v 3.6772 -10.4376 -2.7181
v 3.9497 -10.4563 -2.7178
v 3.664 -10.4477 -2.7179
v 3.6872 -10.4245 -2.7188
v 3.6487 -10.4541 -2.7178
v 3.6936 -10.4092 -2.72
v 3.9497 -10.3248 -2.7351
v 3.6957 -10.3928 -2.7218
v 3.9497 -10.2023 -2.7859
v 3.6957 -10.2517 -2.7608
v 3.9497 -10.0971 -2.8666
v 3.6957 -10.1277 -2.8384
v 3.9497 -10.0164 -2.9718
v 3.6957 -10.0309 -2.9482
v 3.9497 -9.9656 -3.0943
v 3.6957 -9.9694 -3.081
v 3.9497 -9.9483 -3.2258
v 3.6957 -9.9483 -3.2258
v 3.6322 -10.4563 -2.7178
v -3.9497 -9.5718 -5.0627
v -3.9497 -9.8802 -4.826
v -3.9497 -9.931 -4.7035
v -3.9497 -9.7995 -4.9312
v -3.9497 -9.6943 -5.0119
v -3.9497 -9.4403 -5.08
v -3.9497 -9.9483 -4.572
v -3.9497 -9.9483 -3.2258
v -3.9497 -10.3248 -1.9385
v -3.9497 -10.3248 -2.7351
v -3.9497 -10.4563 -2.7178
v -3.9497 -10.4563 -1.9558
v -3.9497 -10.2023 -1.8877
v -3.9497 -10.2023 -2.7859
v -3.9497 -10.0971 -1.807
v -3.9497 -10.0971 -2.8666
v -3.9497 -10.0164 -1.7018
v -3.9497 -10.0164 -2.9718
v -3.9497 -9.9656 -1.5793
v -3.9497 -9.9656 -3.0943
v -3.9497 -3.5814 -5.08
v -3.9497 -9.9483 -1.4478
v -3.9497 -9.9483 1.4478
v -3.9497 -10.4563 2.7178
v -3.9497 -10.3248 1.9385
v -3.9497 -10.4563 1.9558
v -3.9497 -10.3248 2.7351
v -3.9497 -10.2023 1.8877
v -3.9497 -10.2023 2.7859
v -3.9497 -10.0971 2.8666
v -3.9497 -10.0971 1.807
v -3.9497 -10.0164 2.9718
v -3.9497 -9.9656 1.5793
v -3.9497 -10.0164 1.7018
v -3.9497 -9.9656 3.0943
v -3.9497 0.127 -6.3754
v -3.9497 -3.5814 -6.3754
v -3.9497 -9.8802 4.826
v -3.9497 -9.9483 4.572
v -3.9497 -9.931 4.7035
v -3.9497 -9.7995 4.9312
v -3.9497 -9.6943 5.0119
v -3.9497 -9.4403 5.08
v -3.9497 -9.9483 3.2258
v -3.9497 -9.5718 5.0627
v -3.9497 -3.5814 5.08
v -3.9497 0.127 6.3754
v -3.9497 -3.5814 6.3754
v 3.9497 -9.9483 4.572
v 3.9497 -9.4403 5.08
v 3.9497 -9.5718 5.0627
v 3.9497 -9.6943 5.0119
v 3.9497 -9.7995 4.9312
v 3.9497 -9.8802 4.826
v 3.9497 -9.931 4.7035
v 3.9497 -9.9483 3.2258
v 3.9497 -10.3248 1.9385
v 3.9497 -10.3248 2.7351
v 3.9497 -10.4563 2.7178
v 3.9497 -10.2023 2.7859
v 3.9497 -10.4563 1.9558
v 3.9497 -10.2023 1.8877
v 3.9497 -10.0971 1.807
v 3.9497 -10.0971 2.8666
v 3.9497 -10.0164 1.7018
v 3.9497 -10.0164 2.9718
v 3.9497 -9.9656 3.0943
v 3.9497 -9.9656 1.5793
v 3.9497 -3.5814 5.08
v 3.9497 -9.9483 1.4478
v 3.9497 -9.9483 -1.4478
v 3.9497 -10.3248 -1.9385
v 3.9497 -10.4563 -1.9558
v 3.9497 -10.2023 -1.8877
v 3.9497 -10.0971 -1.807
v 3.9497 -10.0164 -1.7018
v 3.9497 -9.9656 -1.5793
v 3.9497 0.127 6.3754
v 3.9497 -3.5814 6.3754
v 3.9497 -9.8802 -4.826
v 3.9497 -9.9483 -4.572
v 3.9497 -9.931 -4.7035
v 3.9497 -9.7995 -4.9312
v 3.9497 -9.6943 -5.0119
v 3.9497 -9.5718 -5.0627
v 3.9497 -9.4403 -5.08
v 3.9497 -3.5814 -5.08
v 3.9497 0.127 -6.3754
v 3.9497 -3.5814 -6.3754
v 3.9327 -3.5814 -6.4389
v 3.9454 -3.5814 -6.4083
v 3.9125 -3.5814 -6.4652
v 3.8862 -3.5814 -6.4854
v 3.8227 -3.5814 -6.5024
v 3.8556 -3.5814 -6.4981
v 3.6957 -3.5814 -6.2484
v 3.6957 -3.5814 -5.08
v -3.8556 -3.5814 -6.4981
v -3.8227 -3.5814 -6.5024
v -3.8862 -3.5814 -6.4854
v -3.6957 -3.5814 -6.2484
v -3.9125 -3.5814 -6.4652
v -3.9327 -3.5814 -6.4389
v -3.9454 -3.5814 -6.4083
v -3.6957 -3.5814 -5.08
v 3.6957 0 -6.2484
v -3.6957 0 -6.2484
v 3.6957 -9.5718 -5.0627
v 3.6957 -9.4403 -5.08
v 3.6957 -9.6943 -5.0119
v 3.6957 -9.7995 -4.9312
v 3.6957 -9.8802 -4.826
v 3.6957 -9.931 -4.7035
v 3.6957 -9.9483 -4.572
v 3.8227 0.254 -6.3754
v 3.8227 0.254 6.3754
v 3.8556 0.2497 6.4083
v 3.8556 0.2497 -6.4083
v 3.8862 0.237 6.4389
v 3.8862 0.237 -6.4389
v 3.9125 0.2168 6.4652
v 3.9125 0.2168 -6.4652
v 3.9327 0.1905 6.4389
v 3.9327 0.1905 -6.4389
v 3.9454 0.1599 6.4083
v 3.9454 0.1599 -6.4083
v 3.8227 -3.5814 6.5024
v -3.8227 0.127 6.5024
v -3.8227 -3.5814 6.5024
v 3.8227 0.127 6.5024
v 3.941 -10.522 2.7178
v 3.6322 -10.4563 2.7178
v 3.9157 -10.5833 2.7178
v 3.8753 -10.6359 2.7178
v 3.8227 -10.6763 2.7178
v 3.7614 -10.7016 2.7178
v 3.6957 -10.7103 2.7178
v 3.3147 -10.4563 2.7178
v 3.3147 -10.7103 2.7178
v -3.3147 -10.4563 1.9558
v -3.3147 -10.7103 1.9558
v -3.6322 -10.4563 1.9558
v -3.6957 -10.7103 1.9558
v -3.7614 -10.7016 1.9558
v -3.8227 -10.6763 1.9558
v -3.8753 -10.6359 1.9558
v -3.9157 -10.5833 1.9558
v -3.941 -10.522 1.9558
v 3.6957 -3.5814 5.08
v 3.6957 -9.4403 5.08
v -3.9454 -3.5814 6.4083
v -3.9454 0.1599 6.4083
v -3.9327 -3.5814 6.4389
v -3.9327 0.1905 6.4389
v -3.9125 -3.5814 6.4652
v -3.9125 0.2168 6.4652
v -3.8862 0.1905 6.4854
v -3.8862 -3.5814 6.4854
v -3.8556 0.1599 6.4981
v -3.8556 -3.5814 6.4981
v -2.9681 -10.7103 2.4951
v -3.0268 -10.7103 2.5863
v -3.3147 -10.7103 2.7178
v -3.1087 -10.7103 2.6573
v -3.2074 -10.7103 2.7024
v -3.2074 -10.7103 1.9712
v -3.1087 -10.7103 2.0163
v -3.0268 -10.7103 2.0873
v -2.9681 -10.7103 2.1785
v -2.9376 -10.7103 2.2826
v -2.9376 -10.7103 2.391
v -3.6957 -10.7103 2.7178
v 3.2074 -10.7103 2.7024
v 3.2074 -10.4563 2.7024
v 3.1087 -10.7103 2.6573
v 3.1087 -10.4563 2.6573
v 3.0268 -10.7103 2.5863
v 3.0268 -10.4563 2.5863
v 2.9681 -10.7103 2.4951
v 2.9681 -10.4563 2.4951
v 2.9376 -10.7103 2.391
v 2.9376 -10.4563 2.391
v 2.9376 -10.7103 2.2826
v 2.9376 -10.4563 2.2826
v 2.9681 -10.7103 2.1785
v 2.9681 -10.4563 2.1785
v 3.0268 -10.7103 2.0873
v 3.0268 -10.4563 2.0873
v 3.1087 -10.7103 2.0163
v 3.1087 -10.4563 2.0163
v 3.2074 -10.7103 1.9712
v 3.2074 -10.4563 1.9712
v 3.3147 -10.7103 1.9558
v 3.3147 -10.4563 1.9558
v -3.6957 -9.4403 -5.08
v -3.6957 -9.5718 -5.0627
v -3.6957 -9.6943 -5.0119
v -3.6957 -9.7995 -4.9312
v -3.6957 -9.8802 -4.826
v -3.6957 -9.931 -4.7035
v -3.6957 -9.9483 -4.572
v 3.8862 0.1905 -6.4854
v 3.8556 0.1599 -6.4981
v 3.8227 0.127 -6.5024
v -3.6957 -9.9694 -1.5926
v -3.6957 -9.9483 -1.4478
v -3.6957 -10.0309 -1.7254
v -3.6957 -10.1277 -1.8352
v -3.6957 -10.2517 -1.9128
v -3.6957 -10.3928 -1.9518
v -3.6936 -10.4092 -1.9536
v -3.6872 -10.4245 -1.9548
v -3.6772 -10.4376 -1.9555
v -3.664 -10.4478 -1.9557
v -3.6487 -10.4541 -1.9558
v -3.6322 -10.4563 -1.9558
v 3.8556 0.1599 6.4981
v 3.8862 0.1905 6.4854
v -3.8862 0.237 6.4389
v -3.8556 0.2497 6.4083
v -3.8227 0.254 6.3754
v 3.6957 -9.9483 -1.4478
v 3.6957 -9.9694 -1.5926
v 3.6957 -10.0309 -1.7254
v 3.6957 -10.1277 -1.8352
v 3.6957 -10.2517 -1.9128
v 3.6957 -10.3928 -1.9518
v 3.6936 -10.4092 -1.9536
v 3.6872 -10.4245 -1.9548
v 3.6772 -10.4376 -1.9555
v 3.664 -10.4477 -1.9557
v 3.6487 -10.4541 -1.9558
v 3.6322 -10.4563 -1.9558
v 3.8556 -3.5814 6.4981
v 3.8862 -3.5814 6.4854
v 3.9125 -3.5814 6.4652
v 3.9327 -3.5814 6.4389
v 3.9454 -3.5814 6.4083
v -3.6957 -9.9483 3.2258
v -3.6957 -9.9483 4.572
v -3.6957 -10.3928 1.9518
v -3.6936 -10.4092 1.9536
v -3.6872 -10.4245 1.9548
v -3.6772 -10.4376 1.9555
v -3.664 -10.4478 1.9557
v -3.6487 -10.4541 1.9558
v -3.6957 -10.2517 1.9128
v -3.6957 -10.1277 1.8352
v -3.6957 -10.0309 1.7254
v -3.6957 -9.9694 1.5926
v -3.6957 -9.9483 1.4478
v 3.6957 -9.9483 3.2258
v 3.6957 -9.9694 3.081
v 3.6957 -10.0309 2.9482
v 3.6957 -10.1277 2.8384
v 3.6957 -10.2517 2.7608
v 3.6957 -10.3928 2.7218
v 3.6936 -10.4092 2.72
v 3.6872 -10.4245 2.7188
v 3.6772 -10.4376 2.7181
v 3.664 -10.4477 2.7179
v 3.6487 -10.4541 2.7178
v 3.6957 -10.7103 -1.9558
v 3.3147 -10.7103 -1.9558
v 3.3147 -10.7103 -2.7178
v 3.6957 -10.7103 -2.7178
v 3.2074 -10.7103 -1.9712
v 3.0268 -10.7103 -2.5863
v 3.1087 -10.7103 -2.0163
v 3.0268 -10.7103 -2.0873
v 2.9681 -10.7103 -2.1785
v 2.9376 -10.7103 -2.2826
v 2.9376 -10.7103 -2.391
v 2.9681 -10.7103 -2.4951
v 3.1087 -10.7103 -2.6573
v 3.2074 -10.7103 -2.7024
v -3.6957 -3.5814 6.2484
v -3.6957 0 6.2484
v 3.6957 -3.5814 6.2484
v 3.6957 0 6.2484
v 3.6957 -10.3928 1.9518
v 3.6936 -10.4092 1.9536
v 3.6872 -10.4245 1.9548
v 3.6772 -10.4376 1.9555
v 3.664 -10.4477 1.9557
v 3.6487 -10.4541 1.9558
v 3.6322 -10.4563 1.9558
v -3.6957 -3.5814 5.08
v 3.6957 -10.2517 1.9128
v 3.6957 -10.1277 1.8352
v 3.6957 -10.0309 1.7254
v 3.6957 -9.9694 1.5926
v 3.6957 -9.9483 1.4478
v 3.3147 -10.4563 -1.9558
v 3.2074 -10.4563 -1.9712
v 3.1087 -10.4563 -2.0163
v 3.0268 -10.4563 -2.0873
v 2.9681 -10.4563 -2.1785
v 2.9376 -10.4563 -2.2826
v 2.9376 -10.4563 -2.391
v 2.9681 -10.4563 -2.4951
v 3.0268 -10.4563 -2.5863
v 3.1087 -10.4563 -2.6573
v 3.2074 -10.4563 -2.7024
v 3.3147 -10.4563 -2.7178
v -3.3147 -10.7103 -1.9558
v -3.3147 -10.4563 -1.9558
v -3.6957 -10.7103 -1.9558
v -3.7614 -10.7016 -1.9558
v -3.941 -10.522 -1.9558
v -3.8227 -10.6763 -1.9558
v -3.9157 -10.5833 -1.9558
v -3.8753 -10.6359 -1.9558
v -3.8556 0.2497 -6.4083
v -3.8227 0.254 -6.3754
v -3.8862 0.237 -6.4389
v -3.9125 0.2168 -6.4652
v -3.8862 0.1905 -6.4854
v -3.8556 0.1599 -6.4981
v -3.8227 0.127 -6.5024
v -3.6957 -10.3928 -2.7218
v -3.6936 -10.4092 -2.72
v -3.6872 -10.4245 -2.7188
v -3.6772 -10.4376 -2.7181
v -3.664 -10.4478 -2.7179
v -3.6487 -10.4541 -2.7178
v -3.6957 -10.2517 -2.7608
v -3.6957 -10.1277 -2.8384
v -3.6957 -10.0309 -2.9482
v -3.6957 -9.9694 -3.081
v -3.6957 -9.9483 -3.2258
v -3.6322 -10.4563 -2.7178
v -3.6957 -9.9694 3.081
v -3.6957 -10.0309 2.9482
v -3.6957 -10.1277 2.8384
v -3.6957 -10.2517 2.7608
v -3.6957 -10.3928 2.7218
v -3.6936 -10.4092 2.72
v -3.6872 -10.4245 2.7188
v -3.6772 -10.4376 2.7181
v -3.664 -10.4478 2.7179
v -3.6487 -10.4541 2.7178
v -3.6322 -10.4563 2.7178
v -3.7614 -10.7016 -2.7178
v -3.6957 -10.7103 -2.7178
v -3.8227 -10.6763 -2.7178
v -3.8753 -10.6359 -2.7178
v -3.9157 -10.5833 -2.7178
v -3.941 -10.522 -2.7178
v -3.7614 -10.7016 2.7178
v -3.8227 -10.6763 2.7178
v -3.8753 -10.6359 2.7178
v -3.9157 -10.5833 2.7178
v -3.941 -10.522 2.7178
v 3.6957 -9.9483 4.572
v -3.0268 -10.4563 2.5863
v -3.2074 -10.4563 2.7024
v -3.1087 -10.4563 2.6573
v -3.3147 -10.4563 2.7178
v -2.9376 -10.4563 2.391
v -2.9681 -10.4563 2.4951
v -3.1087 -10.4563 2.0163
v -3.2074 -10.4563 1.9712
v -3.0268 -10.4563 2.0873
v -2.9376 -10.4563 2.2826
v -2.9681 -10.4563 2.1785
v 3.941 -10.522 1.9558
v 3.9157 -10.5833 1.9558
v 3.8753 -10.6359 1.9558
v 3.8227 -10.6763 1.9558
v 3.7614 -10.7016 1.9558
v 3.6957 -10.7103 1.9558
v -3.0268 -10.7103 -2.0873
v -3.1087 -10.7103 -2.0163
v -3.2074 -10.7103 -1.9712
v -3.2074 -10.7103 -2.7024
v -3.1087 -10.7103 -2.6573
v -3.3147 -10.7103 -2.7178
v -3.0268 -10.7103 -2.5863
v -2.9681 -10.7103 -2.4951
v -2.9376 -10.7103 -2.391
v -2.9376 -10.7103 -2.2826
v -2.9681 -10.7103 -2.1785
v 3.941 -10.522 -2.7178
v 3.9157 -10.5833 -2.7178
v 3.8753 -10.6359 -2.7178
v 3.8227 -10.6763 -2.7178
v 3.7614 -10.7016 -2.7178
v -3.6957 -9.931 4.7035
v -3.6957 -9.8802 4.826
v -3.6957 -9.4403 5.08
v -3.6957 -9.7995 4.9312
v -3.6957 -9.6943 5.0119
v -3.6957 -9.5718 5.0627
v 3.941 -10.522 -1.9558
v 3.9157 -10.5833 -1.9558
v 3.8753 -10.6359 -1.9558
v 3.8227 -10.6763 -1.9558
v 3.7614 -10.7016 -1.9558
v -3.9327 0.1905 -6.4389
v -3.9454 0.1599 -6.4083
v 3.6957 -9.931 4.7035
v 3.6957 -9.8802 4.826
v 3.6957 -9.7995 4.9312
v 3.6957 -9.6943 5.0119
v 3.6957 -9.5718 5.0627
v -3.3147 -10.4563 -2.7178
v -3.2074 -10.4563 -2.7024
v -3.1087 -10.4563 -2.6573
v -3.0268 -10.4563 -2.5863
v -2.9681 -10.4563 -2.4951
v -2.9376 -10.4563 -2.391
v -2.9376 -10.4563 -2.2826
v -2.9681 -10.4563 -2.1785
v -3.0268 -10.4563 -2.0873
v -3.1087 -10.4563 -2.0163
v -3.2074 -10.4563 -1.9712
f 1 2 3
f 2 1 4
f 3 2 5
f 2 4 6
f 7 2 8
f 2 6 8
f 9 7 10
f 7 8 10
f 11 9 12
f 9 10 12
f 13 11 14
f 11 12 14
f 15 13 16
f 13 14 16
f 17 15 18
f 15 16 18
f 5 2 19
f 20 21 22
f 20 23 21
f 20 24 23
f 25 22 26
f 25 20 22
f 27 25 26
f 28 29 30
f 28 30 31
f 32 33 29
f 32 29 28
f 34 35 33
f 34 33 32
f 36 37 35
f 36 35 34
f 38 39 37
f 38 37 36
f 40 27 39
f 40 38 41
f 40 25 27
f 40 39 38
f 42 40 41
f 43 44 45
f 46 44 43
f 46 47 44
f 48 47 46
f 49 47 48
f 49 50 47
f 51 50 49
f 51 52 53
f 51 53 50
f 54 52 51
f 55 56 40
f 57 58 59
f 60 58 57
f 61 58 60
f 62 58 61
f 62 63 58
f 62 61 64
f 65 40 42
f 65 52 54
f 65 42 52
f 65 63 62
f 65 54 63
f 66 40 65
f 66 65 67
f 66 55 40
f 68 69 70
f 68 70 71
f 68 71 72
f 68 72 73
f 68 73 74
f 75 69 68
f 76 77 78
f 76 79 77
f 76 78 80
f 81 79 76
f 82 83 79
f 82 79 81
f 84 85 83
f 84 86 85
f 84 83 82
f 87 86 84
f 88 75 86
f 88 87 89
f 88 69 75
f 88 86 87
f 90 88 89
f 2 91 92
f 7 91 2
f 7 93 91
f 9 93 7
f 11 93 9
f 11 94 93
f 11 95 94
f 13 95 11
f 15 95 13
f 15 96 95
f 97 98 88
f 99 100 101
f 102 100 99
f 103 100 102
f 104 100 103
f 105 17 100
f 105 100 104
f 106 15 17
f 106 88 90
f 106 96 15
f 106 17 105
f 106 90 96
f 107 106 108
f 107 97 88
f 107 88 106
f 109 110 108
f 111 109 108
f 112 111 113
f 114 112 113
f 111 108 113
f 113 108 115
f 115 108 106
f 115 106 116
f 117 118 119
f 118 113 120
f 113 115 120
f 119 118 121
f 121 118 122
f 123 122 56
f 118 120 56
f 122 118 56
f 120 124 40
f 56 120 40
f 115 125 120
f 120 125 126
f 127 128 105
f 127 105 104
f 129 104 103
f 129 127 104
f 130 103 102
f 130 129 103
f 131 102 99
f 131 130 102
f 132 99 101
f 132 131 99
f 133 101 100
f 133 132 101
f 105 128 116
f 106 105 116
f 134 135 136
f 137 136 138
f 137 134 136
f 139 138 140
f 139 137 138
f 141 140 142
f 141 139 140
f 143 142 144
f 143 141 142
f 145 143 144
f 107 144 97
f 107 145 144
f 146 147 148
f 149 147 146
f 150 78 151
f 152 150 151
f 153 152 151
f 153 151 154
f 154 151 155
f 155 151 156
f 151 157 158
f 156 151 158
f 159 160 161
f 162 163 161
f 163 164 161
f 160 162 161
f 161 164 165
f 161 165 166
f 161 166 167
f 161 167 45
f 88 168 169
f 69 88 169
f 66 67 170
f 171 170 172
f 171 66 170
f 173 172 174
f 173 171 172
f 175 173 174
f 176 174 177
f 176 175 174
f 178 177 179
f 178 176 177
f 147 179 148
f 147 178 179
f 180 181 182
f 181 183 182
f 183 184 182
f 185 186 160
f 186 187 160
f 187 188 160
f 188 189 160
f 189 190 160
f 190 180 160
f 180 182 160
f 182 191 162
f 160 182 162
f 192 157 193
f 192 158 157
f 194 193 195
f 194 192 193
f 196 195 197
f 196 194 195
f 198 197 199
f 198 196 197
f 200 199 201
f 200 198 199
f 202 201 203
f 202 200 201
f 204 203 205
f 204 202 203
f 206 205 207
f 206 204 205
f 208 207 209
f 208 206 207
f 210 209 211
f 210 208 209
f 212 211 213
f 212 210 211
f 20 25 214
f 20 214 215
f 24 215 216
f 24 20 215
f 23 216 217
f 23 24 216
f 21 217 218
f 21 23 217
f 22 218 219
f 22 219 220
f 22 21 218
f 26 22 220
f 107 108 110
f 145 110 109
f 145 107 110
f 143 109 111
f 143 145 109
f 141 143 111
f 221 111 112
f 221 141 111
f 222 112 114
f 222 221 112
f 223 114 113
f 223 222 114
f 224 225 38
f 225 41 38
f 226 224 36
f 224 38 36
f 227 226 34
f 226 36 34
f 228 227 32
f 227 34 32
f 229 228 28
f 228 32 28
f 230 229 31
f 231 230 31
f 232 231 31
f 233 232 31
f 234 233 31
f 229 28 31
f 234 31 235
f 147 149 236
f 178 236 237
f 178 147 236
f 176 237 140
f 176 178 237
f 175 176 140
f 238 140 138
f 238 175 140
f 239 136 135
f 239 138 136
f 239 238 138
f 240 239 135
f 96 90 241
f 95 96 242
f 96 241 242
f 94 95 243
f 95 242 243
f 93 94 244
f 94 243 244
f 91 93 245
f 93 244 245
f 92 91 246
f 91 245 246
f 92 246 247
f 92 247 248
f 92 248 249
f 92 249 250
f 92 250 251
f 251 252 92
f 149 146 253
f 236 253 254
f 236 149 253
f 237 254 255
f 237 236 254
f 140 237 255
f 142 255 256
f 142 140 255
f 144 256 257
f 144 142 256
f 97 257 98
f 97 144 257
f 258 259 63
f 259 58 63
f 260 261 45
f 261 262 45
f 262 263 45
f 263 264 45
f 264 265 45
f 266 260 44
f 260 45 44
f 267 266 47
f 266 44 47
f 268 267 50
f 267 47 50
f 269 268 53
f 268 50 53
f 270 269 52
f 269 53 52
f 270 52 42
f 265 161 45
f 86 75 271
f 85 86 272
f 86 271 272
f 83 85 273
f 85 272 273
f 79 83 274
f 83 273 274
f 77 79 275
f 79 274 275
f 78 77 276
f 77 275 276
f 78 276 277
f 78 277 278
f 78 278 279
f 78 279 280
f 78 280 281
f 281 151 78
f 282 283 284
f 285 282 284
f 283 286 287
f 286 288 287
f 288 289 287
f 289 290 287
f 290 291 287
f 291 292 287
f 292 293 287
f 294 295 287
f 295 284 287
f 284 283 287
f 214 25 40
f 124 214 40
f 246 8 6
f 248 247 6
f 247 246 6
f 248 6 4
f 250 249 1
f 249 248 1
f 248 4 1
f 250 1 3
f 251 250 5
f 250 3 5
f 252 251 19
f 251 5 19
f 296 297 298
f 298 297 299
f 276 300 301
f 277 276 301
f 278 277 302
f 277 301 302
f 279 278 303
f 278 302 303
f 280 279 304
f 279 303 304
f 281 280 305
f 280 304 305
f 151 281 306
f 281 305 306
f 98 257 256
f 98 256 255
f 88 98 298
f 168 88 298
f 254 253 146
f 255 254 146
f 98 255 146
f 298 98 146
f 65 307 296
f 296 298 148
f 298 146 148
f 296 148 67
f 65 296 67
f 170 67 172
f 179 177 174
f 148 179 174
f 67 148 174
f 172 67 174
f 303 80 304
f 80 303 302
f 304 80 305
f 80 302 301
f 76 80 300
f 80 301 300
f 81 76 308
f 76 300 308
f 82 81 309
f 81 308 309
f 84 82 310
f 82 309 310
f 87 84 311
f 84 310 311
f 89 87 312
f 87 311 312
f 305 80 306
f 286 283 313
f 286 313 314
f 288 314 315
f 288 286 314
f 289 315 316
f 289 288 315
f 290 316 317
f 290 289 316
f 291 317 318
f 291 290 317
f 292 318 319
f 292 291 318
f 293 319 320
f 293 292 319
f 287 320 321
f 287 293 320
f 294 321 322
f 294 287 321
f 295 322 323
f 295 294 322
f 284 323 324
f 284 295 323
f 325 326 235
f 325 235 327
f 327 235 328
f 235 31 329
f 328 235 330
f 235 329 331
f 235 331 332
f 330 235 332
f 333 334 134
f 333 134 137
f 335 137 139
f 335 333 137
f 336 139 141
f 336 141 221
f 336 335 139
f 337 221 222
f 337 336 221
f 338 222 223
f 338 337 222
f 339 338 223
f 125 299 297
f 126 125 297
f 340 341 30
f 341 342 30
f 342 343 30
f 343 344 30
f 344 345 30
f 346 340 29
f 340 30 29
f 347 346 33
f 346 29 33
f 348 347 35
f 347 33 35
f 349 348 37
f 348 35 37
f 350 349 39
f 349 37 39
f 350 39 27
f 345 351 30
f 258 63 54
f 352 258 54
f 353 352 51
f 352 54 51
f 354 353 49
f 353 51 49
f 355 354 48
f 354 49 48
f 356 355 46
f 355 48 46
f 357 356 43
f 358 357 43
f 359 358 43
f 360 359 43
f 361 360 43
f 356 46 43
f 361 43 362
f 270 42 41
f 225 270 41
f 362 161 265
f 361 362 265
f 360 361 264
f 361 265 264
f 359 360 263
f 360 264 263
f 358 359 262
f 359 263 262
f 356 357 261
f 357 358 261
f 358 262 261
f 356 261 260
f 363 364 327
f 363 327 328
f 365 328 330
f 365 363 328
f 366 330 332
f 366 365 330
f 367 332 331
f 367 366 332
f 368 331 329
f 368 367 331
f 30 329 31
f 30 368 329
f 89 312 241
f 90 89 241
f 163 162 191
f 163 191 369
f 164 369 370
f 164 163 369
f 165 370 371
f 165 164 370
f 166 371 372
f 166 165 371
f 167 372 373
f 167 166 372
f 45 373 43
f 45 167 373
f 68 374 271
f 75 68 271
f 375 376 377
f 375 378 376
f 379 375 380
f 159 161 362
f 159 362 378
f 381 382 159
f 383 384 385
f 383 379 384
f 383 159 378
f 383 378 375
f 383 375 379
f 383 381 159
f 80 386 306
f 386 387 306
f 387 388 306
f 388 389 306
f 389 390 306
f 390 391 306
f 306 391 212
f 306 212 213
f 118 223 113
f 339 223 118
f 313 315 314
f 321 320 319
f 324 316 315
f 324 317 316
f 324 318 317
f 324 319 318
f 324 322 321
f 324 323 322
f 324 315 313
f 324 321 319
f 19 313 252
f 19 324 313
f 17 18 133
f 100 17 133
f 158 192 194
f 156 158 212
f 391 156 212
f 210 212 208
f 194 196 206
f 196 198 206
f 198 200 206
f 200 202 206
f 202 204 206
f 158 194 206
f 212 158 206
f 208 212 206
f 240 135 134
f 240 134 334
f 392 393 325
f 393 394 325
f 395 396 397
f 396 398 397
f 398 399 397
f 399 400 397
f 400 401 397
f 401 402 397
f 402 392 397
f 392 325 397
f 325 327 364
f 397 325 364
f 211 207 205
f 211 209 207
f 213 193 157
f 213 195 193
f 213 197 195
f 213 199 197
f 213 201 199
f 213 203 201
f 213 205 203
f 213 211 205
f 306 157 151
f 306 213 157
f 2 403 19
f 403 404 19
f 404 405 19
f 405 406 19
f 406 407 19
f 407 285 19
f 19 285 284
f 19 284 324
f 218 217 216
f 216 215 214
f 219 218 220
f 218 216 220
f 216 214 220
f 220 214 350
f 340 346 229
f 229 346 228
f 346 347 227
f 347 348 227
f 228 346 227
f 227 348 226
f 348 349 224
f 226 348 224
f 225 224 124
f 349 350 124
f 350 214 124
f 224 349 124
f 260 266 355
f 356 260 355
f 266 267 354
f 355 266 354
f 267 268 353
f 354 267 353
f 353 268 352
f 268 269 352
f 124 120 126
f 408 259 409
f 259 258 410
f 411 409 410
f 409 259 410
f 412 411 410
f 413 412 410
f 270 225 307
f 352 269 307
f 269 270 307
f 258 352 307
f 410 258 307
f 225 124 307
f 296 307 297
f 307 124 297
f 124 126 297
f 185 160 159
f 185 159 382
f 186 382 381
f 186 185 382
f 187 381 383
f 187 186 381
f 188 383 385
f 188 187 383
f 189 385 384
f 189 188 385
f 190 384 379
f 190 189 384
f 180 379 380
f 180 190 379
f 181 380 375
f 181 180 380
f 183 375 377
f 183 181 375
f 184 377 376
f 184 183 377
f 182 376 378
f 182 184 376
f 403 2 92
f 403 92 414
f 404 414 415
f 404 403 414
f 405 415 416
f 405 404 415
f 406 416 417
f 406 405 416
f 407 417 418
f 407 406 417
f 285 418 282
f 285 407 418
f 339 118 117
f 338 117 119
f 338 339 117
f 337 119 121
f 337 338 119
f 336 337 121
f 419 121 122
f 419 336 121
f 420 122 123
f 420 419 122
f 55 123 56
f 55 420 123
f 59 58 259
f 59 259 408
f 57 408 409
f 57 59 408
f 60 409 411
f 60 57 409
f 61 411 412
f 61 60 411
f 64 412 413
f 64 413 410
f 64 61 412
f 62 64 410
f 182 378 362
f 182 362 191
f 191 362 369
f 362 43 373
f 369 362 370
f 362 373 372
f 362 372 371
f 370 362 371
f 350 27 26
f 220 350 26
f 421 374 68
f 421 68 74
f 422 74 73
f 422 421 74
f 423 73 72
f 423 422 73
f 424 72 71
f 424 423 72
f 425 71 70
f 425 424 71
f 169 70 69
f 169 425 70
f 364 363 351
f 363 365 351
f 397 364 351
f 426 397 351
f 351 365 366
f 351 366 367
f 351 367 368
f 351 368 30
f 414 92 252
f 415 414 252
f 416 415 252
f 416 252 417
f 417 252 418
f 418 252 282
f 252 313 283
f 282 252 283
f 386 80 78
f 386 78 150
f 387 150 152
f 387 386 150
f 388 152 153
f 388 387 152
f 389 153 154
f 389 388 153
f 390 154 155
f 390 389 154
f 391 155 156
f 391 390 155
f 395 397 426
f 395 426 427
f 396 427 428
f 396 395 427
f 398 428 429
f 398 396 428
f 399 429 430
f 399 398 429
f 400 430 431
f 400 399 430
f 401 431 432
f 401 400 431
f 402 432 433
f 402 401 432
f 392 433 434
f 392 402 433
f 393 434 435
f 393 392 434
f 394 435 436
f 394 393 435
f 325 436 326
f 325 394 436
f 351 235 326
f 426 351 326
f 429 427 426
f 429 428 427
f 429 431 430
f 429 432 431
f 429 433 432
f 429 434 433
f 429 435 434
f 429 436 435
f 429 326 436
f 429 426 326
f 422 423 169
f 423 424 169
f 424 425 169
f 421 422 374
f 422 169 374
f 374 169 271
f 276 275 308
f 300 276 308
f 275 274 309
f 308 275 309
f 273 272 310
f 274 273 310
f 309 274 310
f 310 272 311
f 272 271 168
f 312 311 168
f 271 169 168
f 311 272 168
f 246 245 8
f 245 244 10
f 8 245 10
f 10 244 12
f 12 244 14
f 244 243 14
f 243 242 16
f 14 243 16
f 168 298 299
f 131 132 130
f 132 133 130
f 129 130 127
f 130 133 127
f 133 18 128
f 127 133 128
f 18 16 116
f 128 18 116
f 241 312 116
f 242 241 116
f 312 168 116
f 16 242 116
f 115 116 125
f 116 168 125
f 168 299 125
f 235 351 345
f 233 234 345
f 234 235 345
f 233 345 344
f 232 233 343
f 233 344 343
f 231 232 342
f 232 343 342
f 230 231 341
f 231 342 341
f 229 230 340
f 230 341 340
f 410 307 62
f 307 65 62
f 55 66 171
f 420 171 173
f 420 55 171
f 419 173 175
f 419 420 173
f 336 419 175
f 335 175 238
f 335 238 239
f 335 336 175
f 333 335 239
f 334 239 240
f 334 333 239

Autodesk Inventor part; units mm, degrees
sketch "Sketch_1" plane through (0, 0, 0) normal (0, 1, 0) x (-1, 0, 0)
  line L0 (3.9497, -6.3754) -> (3.9497, 6.3754)
  arc A0 (3.9497, 6.3754) -> (3.8227, 6.5024) centre (3.8227, 6.3754) ccw
  line L1 (3.8227, 6.5024) -> (-3.8227, 6.5024)
  arc A1 (-3.8227, 6.5024) -> (-3.9497, 6.3754) centre (-3.8227, 6.3754) ccw
  line L2 (-3.9497, 6.3754) -> (-3.9497, -6.3754)
  arc A2 (-3.9497, -6.3754) -> (-3.8227, -6.5024) centre (-3.8227, -6.3754) ccw
  line L3 (-3.8227, -6.5024) -> (3.8227, -6.5024)
  arc A3 (3.8227, -6.5024) -> (3.9497, -6.3754) centre (3.8227, -6.3754) ccw
  line L4 (3.6957, -6.2484) -> (3.6957, 6.2484)
  line L5 (3.6957, 6.2484) -> (-3.6957, 6.2484)
  line L6 (-3.6957, 6.2484) -> (-3.6957, -6.2484)
  line L7 (-3.6957, -6.2484) -> (3.6957, -6.2484)
extrude "Extrusion1" add sketch "Sketch_1" against normal blind 3.5814
sketch "Sketch_2" plane through (0, 0, 0) normal (0, 1, 0) x (-1, 0, 0)
  line L0 (3.9497, -6.3754) -> (3.9497, 6.3754)
  arc A0 (3.9497, 6.3754) -> (3.8227, 6.5024) centre (3.8227, 6.3754) ccw
  line L1 (3.8227, 6.5024) -> (-3.8227, 6.5024)
  arc A1 (-3.8227, 6.5024) -> (-3.9497, 6.3754) centre (-3.8227, 6.3754) ccw
  line L2 (-3.9497, 6.3754) -> (-3.9497, -6.3754)
  arc A2 (-3.9497, -6.3754) -> (-3.8227, -6.5024) centre (-3.8227, -6.3754) ccw
  line L3 (-3.8227, -6.5024) -> (3.8227, -6.5024)
  arc A3 (3.8227, -6.5024) -> (3.9497, -6.3754) centre (3.8227, -6.3754) ccw
extrude "Extrusion2" add sketch "Sketch_2" along normal blind 0.254
sketch "Sketch_7" plane through (0, 0, 0) normal (0, 0, 1) x (1, 0, 0)
  line L0 (-3.9497, 0.4023) -> (-3.9497, 0.127)
  arc A0 (-3.8227, 0.254) -> (-3.9497, 0.127) centre (-3.8227, 0.127) ccw
  line L1 (-3.8227, 0.254) -> (3.8227, 0.254)
  arc A1 (3.9497, 0.127) -> (3.8227, 0.254) centre (3.8227, 0.127) ccw
  line L2 (3.9497, 0.127) -> (3.9497, 0.4023)
  line L3 (3.9497, 0.4023) -> (-3.9497, 0.4023)
extrude "Extrusion3" cut sketch "Sketch_7" along normal mid plane 15.24
sketch "Sketch_8" plane through (0, 0, 0) normal (1, 0, 0) x (0, 1, 0)
  line L0 (0.4023, 6.5024) -> (0.127, 6.5024)
  arc A0 (0.254, 6.3754) -> (0.127, 6.5024) centre (0.127, 6.3754) ccw
  line L1 (0.254, 6.3754) -> (0.254, -6.3754)
  arc A1 (0.127, -6.5024) -> (0.254, -6.3754) centre (0.127, -6.3754) ccw
  line L2 (0.127, -6.5024) -> (0.4023, -6.5024)
  line L3 (0.4023, -6.5024) -> (0.4023, 6.5024)
extrude "Extrusion4" cut sketch "Sketch_8" along normal mid plane 15.24
sketch "Sketch_13" plane through (0, 0, 0) normal (1, 0, 0) x (0, 1, 0)
  line L0 (-3.5814, 5.08) -> (-9.4403, 5.08)
  arc A0 (-9.4403, 5.08) -> (-9.9483, 4.572) centre (-9.4403, 4.572) ccw
  line L1 (-9.9483, 4.572) -> (-9.9483, 3.2258)
  arc A1 (-10.4563, 2.7178) -> (-9.9483, 3.2258) centre (-10.4563, 3.2258) ccw
  line L2 (-10.4563, 2.7178) -> (-10.7103, 2.7178)
  line L3 (-10.7103, 2.7178) -> (-10.7103, 1.9558)
  line L4 (-10.7103, 1.9558) -> (-10.4563, 1.9558)
  arc A2 (-9.9483, 1.4478) -> (-10.4563, 1.9558) centre (-10.4563, 1.4478) ccw
  line L5 (-9.9483, 1.4478) -> (-9.9483, -1.4478)
  arc A3 (-10.4563, -1.9558) -> (-9.9483, -1.4478) centre (-10.4563, -1.4478) ccw
  line L6 (-10.4563, -1.9558) -> (-10.7103, -1.9558)
  line L7 (-10.7103, -1.9558) -> (-10.7103, -2.7178)
  line L8 (-10.7103, -2.7178) -> (-10.4563, -2.7178)
  arc A4 (-9.9483, -3.2258) -> (-10.4563, -2.7178) centre (-10.4563, -3.2258) ccw
  line L9 (-9.9483, -3.2258) -> (-9.9483, -4.572)
  arc A5 (-9.9483, -4.572) -> (-9.4403, -5.08) centre (-9.4403, -4.572) ccw
  line L10 (-9.4403, -5.08) -> (-3.5814, -5.08)
  line L11 (-3.5814, -5.08) -> (-3.5814, 5.08)
extrude "Extrusion5" add sketch "Sketch_13" along normal mid plane 7.8994
sketch "Sketch_14" plane through (0, 0, 0) normal (0, 0, 1) x (1, 0, 0)
  line L0 (-3.9497, -11.1282) -> (3.9497, -11.1282)
  line L1 (3.9497, -11.1282) -> (3.9497, -10.4563)
  arc A0 (3.6957, -10.7103) -> (3.9497, -10.4563) centre (3.6957, -10.4563) ccw
  line L2 (3.6957, -10.7103) -> (3.3147, -10.7103)
  line L3 (3.3147, -10.7103) -> (3.3147, -10.4563)
  line L4 (3.3147, -10.4563) -> (3.6322, -10.4563)
  arc A1 (3.6322, -10.4563) -> (3.6957, -10.3928) centre (3.6322, -10.3928) ccw
  line L5 (3.6957, -10.3928) -> (3.6957, -3.5814)
  line L6 (3.6957, -3.5814) -> (-3.6957, -3.5814)
  line L7 (-3.6957, -3.5814) -> (-3.6957, -10.3928)
  arc A2 (-3.6957, -10.3928) -> (-3.6322, -10.4563) centre (-3.6322, -10.3928) ccw
  line L8 (-3.6322, -10.4563) -> (-3.3147, -10.4563)
  line L9 (-3.3147, -10.4563) -> (-3.3147, -10.7103)
  line L10 (-3.3147, -10.7103) -> (-3.6957, -10.7103)
  arc A3 (-3.9497, -10.4563) -> (-3.6957, -10.7103) centre (-3.6957, -10.4563) ccw
  line L11 (-3.9497, -10.4563) -> (-3.9497, -11.1282)
extrude "Extrusion6" cut sketch "Sketch_14" along normal mid plane 10.287
sketch "Sketch_29" plane through (-3.6957, -10.7103, 1.9558) normal (0, -1, 0) x (1, 0, 0)
  line L0 (0, 0.762) -> (0, 0)
  line L1 (0, 0) -> (0.381, 0)
  arc A0 (0.381, 0) -> (0.381, 0.762) centre (0.381, 0.381) ccw
  line L2 (0.381, 0.762) -> (0, 0.762)
extrude "Extrusion7" add sketch "Sketch_29" against normal blind 0.254
sketch "Sketch_30" plane through (-3.6957, -10.7103, 1.9558) normal (0, -1, 0) x (1, 0, 0)
  arc A0 (7.0104, 0.762) -> (7.0104, 0) centre (7.0104, 0.381) ccw
  line L0 (7.0104, 0) -> (7.3914, 0)
  line L1 (7.3914, 0) -> (7.3914, 0.762)
  line L2 (7.3914, 0.762) -> (7.0104, 0.762)
extrude "Extrusion8" add sketch "Sketch_30" against normal blind 0.254
sketch "Sketch_31" plane through (-3.6957, -10.7103, -2.7178) normal (0, -1, 0) x (1, 0, 0)
  line L0 (0, 0.762) -> (0, 0)
  line L1 (0, 0) -> (0.381, 0)
  arc A0 (0.381, 0) -> (0.381, 0.762) centre (0.381, 0.381) ccw
  line L2 (0.381, 0.762) -> (0, 0.762)
extrude "Extrusion9" add sketch "Sketch_31" against normal blind 0.254
sketch "Sketch_32" plane through (-3.6957, -10.7103, -2.7178) normal (0, -1, 0) x (1, 0, 0)
  arc A0 (7.0104, 0.762) -> (7.0104, 0) centre (7.0104, 0.381) ccw
  line L0 (7.0104, 0) -> (7.3914, 0)
  line L1 (7.3914, 0) -> (7.3914, 0.762)
  line L2 (7.3914, 0.762) -> (7.0104, 0.762)
extrude "Extrusion10" add sketch "Sketch_32" against normal blind 0.254
ref_plane "to_body_XY" through (0, 0, 0) normal (0, 1, 0) x (1, 0, 0)
ref_plane "to_body_YZ" through (0, 0, 0) normal (1, 0, 0) x (0, 0, -1)
ref_plane "to_body_ZX" through (0, 0, 0) normal (0, 0, -1) x (0, 1, 0)
ref_plane "to_bushings_XY" through (0, 0.254, 0) normal (0, -1, 0) x (1, 0, 0)
ref_plane "to_bushings_YZ" through (0, 0.254, 0) normal (1, 0, 0) x (0, 0, 1)
ref_plane "to_bushings_ZX" through (0, 0.254, 0) normal (0, 0, 1) x (0, -1, 0)
properties part number "MB2011c"
